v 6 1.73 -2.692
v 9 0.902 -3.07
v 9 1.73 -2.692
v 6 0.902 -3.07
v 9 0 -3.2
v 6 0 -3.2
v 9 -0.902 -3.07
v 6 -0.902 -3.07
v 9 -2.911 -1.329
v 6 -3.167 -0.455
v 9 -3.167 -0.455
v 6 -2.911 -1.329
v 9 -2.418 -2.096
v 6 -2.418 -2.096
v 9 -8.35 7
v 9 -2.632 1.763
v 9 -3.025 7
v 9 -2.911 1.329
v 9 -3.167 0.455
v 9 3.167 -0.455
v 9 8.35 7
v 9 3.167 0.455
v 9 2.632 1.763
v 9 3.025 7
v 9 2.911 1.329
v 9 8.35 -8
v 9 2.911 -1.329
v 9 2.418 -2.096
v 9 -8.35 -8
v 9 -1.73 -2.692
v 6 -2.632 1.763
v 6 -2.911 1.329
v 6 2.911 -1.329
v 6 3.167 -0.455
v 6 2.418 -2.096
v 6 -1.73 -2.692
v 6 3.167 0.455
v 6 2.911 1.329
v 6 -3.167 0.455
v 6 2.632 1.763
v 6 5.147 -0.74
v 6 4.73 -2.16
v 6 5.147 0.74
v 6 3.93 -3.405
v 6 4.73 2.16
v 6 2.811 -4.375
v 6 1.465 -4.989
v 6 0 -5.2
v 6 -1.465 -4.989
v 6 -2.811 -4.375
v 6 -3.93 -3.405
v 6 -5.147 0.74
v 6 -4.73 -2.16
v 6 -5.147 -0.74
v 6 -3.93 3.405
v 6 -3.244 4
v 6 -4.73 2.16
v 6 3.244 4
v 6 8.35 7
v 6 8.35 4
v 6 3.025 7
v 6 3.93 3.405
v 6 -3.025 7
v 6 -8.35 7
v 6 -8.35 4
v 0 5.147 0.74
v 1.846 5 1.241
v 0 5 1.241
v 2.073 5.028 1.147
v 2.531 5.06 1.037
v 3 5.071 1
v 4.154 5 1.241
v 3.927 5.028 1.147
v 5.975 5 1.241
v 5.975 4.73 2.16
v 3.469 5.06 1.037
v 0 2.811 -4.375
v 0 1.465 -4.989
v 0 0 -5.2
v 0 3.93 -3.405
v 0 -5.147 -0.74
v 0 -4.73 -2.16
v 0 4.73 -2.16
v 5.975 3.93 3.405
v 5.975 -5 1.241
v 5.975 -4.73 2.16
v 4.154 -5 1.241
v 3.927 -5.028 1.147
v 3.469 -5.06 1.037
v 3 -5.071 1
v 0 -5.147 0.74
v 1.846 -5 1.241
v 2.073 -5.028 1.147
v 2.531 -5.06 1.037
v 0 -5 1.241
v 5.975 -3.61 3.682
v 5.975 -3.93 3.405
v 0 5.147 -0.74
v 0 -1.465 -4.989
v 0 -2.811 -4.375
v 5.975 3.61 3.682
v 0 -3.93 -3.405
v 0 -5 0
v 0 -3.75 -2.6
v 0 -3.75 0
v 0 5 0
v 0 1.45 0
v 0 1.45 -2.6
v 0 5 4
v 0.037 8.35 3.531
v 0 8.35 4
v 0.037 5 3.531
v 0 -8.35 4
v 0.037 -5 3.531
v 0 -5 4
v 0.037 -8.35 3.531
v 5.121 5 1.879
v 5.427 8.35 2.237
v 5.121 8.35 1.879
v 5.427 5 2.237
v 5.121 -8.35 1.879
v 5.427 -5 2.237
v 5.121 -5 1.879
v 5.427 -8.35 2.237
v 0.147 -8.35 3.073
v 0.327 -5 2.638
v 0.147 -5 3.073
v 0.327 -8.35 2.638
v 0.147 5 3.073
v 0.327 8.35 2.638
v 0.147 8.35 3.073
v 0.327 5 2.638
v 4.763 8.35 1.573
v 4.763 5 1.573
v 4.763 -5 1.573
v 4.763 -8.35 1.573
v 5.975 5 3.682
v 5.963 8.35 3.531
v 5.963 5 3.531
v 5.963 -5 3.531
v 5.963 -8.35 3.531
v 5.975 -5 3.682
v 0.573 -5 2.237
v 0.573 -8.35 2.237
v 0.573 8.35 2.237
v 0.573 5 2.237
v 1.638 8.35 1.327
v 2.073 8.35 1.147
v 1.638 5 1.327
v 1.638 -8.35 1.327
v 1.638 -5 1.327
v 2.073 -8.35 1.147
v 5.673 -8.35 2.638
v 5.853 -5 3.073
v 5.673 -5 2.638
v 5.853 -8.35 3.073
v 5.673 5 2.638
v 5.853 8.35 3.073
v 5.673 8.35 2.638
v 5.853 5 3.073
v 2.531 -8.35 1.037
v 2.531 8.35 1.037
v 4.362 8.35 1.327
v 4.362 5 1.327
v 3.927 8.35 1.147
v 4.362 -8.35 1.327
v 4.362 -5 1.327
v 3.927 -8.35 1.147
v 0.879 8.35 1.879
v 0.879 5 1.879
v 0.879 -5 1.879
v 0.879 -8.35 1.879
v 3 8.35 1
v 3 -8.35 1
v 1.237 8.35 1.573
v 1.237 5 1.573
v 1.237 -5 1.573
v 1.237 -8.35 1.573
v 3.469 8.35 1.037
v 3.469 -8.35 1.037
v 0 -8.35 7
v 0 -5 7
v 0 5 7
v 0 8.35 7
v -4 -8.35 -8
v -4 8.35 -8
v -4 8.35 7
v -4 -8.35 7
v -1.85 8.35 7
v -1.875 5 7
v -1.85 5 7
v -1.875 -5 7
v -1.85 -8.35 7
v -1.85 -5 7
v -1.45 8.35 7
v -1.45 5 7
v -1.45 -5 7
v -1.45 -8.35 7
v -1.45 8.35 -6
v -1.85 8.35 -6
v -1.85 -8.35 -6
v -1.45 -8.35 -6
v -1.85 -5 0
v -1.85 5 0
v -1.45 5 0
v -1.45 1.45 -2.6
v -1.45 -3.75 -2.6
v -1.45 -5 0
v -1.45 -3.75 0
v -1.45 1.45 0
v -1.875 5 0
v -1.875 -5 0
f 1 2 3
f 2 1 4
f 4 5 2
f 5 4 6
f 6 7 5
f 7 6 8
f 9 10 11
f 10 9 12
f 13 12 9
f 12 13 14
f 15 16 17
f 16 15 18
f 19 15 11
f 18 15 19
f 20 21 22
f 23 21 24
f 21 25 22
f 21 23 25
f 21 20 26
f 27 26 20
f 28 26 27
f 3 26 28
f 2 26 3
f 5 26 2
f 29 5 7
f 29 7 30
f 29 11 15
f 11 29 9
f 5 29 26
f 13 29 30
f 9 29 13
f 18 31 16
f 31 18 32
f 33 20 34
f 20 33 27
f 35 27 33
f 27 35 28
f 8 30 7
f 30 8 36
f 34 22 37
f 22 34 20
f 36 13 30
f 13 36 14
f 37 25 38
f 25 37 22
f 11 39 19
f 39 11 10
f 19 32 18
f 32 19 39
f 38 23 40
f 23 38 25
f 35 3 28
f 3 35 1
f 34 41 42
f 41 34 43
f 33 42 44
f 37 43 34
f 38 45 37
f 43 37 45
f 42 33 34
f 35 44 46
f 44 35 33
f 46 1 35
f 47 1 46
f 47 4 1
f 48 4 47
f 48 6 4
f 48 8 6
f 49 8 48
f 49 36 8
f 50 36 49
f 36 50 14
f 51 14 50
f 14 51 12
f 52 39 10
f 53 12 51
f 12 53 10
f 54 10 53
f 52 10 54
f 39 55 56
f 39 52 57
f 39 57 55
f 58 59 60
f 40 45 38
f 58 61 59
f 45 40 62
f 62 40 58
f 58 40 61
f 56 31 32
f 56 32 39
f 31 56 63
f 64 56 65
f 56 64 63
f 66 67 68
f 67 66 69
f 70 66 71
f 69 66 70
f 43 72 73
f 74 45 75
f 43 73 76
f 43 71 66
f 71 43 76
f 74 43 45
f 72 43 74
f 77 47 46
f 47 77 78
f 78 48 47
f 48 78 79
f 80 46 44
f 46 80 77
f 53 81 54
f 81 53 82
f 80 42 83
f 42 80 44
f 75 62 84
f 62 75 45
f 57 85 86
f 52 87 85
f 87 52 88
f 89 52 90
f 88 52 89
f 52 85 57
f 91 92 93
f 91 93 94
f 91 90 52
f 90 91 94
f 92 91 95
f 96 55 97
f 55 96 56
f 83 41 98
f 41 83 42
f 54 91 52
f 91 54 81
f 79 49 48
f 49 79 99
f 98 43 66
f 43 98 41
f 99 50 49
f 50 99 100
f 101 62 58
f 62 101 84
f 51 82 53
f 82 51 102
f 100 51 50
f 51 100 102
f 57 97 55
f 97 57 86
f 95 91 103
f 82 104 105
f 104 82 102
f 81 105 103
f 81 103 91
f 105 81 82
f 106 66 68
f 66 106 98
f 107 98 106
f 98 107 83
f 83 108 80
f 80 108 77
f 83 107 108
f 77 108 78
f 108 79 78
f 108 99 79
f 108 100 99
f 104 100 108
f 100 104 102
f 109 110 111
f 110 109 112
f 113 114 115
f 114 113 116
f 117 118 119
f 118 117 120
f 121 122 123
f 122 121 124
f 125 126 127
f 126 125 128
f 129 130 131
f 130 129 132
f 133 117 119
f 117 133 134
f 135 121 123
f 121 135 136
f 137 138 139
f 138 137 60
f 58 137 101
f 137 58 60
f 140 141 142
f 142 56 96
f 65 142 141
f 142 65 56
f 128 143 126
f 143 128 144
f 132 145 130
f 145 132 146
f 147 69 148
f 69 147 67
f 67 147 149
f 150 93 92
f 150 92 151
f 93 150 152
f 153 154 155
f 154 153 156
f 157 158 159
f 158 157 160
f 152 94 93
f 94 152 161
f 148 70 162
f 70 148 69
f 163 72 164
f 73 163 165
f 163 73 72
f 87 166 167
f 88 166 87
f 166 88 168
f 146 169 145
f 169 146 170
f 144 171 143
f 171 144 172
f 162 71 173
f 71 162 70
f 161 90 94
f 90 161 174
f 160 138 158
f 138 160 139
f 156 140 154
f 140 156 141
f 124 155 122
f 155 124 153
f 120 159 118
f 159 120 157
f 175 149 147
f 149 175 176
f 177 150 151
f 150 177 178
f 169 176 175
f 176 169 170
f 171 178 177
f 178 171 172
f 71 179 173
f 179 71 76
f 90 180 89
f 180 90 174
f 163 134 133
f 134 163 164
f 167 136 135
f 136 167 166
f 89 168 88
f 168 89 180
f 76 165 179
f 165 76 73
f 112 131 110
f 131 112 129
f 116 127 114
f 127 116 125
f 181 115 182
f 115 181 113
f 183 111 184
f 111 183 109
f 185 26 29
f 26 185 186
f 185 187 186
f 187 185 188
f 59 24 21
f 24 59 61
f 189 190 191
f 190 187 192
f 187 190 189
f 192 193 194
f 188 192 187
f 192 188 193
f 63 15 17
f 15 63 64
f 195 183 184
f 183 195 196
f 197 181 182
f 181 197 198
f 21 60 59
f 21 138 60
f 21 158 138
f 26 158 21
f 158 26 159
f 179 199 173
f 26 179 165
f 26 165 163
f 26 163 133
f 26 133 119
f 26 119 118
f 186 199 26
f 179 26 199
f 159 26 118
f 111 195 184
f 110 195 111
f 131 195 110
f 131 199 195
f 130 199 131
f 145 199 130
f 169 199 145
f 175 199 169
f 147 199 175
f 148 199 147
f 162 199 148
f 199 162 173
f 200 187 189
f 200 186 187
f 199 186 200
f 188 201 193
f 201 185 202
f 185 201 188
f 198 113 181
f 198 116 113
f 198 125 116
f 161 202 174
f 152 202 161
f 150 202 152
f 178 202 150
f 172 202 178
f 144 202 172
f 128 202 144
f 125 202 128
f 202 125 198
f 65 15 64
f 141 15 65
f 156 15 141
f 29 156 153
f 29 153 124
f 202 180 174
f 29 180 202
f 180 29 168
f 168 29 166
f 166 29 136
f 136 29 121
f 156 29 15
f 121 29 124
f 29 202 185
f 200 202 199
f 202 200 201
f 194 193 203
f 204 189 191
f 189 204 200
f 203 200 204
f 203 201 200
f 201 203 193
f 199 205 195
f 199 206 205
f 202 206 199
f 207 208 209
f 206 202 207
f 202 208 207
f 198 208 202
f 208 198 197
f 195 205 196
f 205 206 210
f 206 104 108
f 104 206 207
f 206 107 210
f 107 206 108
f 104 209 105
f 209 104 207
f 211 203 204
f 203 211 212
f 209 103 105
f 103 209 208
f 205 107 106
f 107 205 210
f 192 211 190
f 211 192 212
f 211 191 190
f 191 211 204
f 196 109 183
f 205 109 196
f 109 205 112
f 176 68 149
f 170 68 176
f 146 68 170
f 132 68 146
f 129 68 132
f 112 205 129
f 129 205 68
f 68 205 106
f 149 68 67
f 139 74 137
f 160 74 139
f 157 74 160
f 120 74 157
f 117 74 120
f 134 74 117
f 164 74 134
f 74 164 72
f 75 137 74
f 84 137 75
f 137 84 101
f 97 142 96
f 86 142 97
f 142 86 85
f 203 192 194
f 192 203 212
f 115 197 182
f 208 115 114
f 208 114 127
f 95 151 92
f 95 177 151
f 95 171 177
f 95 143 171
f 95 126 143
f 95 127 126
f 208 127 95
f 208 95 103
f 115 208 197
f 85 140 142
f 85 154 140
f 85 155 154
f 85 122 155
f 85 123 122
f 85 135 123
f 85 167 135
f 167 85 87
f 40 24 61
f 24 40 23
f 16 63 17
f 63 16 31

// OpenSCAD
// Lights1a
// headblock for leds, fibers insert with ferrules Lights1b part

module Rx1(){
tol=0.20;
Off1 = 1.15;

difference(){
// Rx body
translate([-4,-8.35,-8]) color("cyan")
linear_extrude(height=15) square(size=[13,16.7]);


rotate([0,90,0])
//difference(){
union(){
//------------
// First jacket
translate([0,0,16]) color("green")
cylinder(r1=4+tol,r2=2+tol,h=20,$fn=22);

//------------
// Narrow part
translate([0,0,6]) color("pink")
cylinder(r1=3+tol,r2=3+tol,h=3,$fn=22);
/*
//------------
// wide part
translate([0,0,9]) color("red")
cylinder(r1=5+tol,r2=5+tol,h=3,$fn=12);
translate([0,0,12]) color("red")
cylinder(r1=4+tol,r2=4+tol,h=2,$fn=12);
translate([0,0,14]) color("red")
cylinder(r1=5+tol,r2=5+tol,h=3,$fn=12);
*/
//-------------
//  head
translate([0,0,0]) color("orange")
cylinder(r1=5+tol,r2=5+tol,h=6,$fn=22);

}

//-------
// Fiber
//color("cyan")
//cylinder(r1=1.6,r2=1.7, h=50,$fn=22);
//}

//==========
// led tape and chip
translate([-1.85,-20,-6])
//linear_extrude(height=12) square(size=[0.2+tol,40]);
linear_extrude(height=16) square(size=[0.2+tol,40]);
translate([-1.65,-2.5-tol/2-Off1,-2.5-tol/2])
linear_extrude(height=5+tol) square(size=[1.65+tol,5+tol]);

//-------
// cut for the ferrule head
translate([1.85+tol,0,0]) color("cyan")
linear_extrude(height=10) square(size=[1.85+6,10],center=true);

// cut for the ferrule neck
translate([7,0,0]) color("cyan")
linear_extrude(height=10,scale=1.3) square(size=[6,5.0],center=true);

/*
// cuts to create spring action on led
translate([-3,-3-Off1,-6]) color("pink")
linear_extrude(height=14) square(size=[3,0.5],center=true);
translate([-3,3-Off1,-6]) color("pink")
linear_extrude(height=14) square(size=[3,0.5],center=true);
translate([-4,-Off1,-6]) color("pink")
linear_extrude(height=14,scale=[3,1]) square(size=[1,6],center=true);

// cuts to create spring action on ferrule
translate([7,-5.5,1]) color("pink") rotate([-15,0,0])
linear_extrude(height=8) square(size=[4,0.5],center=true);
translate([7,5.5,1]) color("pink") rotate([15,0,0])
linear_extrude(height=8) square(size=[4,0.5],center=true);
*/

// material reduction on sidewalls
// possible locking mechanism?
translate([3,-20,4]) color("green") rotate([-90,-90,0]){
cylinder(r=3.0,h=40,$fn=40);
    translate([3,0,0])
    linear_extrude(height=40) square(6,center=true);
}
}

}


for(i=[0:0]){
    translate([0,16.7*i,0]) Rx1();
}


//-------------------- simplified model for cutouts
module Rx2(){
tol=0.20;
Off1 = 1.25;

difference(){
// Rx body
translate([-4,-8.35,-8]) color("cyan")
linear_extrude(height=15) square(size=[13,16.7]);


rotate([0,90,0])
//difference(){
union(){
//------------
// Narrow part
translate([0,0,6]) color("pink")
cylinder(r1=3+tol,r2=3+tol,h=3,$fn=22);
//-------------
//  head
translate([0,0,0]) color("orange")
cylinder(r1=5+tol,r2=5+tol,h=6,$fn=22);

}

// led tape and chip
translate([-1.85,-20,-6])
//linear_extrude(height=12) square(size=[0.2+tol,40]);
linear_extrude(height=16) square(size=[0.2+tol,40]);
translate([-1.65,-2.5-tol/2-Off1,-2.5-tol/2])
linear_extrude(height=5+tol) square(size=[1.65+tol,5+tol]);

//-------
// cut for the ferrule head
translate([1.85+tol,0,0]) color("cyan")
linear_extrude(height=10) square(size=[1.85+6,10],center=true);

// cut for the ferrule neck
translate([7,0,0]) color("cyan")
linear_extrude(height=10) square(size=[6,5.5],center=true);

}

}

/*
translate([20,20,0])
Rx2();
*/
